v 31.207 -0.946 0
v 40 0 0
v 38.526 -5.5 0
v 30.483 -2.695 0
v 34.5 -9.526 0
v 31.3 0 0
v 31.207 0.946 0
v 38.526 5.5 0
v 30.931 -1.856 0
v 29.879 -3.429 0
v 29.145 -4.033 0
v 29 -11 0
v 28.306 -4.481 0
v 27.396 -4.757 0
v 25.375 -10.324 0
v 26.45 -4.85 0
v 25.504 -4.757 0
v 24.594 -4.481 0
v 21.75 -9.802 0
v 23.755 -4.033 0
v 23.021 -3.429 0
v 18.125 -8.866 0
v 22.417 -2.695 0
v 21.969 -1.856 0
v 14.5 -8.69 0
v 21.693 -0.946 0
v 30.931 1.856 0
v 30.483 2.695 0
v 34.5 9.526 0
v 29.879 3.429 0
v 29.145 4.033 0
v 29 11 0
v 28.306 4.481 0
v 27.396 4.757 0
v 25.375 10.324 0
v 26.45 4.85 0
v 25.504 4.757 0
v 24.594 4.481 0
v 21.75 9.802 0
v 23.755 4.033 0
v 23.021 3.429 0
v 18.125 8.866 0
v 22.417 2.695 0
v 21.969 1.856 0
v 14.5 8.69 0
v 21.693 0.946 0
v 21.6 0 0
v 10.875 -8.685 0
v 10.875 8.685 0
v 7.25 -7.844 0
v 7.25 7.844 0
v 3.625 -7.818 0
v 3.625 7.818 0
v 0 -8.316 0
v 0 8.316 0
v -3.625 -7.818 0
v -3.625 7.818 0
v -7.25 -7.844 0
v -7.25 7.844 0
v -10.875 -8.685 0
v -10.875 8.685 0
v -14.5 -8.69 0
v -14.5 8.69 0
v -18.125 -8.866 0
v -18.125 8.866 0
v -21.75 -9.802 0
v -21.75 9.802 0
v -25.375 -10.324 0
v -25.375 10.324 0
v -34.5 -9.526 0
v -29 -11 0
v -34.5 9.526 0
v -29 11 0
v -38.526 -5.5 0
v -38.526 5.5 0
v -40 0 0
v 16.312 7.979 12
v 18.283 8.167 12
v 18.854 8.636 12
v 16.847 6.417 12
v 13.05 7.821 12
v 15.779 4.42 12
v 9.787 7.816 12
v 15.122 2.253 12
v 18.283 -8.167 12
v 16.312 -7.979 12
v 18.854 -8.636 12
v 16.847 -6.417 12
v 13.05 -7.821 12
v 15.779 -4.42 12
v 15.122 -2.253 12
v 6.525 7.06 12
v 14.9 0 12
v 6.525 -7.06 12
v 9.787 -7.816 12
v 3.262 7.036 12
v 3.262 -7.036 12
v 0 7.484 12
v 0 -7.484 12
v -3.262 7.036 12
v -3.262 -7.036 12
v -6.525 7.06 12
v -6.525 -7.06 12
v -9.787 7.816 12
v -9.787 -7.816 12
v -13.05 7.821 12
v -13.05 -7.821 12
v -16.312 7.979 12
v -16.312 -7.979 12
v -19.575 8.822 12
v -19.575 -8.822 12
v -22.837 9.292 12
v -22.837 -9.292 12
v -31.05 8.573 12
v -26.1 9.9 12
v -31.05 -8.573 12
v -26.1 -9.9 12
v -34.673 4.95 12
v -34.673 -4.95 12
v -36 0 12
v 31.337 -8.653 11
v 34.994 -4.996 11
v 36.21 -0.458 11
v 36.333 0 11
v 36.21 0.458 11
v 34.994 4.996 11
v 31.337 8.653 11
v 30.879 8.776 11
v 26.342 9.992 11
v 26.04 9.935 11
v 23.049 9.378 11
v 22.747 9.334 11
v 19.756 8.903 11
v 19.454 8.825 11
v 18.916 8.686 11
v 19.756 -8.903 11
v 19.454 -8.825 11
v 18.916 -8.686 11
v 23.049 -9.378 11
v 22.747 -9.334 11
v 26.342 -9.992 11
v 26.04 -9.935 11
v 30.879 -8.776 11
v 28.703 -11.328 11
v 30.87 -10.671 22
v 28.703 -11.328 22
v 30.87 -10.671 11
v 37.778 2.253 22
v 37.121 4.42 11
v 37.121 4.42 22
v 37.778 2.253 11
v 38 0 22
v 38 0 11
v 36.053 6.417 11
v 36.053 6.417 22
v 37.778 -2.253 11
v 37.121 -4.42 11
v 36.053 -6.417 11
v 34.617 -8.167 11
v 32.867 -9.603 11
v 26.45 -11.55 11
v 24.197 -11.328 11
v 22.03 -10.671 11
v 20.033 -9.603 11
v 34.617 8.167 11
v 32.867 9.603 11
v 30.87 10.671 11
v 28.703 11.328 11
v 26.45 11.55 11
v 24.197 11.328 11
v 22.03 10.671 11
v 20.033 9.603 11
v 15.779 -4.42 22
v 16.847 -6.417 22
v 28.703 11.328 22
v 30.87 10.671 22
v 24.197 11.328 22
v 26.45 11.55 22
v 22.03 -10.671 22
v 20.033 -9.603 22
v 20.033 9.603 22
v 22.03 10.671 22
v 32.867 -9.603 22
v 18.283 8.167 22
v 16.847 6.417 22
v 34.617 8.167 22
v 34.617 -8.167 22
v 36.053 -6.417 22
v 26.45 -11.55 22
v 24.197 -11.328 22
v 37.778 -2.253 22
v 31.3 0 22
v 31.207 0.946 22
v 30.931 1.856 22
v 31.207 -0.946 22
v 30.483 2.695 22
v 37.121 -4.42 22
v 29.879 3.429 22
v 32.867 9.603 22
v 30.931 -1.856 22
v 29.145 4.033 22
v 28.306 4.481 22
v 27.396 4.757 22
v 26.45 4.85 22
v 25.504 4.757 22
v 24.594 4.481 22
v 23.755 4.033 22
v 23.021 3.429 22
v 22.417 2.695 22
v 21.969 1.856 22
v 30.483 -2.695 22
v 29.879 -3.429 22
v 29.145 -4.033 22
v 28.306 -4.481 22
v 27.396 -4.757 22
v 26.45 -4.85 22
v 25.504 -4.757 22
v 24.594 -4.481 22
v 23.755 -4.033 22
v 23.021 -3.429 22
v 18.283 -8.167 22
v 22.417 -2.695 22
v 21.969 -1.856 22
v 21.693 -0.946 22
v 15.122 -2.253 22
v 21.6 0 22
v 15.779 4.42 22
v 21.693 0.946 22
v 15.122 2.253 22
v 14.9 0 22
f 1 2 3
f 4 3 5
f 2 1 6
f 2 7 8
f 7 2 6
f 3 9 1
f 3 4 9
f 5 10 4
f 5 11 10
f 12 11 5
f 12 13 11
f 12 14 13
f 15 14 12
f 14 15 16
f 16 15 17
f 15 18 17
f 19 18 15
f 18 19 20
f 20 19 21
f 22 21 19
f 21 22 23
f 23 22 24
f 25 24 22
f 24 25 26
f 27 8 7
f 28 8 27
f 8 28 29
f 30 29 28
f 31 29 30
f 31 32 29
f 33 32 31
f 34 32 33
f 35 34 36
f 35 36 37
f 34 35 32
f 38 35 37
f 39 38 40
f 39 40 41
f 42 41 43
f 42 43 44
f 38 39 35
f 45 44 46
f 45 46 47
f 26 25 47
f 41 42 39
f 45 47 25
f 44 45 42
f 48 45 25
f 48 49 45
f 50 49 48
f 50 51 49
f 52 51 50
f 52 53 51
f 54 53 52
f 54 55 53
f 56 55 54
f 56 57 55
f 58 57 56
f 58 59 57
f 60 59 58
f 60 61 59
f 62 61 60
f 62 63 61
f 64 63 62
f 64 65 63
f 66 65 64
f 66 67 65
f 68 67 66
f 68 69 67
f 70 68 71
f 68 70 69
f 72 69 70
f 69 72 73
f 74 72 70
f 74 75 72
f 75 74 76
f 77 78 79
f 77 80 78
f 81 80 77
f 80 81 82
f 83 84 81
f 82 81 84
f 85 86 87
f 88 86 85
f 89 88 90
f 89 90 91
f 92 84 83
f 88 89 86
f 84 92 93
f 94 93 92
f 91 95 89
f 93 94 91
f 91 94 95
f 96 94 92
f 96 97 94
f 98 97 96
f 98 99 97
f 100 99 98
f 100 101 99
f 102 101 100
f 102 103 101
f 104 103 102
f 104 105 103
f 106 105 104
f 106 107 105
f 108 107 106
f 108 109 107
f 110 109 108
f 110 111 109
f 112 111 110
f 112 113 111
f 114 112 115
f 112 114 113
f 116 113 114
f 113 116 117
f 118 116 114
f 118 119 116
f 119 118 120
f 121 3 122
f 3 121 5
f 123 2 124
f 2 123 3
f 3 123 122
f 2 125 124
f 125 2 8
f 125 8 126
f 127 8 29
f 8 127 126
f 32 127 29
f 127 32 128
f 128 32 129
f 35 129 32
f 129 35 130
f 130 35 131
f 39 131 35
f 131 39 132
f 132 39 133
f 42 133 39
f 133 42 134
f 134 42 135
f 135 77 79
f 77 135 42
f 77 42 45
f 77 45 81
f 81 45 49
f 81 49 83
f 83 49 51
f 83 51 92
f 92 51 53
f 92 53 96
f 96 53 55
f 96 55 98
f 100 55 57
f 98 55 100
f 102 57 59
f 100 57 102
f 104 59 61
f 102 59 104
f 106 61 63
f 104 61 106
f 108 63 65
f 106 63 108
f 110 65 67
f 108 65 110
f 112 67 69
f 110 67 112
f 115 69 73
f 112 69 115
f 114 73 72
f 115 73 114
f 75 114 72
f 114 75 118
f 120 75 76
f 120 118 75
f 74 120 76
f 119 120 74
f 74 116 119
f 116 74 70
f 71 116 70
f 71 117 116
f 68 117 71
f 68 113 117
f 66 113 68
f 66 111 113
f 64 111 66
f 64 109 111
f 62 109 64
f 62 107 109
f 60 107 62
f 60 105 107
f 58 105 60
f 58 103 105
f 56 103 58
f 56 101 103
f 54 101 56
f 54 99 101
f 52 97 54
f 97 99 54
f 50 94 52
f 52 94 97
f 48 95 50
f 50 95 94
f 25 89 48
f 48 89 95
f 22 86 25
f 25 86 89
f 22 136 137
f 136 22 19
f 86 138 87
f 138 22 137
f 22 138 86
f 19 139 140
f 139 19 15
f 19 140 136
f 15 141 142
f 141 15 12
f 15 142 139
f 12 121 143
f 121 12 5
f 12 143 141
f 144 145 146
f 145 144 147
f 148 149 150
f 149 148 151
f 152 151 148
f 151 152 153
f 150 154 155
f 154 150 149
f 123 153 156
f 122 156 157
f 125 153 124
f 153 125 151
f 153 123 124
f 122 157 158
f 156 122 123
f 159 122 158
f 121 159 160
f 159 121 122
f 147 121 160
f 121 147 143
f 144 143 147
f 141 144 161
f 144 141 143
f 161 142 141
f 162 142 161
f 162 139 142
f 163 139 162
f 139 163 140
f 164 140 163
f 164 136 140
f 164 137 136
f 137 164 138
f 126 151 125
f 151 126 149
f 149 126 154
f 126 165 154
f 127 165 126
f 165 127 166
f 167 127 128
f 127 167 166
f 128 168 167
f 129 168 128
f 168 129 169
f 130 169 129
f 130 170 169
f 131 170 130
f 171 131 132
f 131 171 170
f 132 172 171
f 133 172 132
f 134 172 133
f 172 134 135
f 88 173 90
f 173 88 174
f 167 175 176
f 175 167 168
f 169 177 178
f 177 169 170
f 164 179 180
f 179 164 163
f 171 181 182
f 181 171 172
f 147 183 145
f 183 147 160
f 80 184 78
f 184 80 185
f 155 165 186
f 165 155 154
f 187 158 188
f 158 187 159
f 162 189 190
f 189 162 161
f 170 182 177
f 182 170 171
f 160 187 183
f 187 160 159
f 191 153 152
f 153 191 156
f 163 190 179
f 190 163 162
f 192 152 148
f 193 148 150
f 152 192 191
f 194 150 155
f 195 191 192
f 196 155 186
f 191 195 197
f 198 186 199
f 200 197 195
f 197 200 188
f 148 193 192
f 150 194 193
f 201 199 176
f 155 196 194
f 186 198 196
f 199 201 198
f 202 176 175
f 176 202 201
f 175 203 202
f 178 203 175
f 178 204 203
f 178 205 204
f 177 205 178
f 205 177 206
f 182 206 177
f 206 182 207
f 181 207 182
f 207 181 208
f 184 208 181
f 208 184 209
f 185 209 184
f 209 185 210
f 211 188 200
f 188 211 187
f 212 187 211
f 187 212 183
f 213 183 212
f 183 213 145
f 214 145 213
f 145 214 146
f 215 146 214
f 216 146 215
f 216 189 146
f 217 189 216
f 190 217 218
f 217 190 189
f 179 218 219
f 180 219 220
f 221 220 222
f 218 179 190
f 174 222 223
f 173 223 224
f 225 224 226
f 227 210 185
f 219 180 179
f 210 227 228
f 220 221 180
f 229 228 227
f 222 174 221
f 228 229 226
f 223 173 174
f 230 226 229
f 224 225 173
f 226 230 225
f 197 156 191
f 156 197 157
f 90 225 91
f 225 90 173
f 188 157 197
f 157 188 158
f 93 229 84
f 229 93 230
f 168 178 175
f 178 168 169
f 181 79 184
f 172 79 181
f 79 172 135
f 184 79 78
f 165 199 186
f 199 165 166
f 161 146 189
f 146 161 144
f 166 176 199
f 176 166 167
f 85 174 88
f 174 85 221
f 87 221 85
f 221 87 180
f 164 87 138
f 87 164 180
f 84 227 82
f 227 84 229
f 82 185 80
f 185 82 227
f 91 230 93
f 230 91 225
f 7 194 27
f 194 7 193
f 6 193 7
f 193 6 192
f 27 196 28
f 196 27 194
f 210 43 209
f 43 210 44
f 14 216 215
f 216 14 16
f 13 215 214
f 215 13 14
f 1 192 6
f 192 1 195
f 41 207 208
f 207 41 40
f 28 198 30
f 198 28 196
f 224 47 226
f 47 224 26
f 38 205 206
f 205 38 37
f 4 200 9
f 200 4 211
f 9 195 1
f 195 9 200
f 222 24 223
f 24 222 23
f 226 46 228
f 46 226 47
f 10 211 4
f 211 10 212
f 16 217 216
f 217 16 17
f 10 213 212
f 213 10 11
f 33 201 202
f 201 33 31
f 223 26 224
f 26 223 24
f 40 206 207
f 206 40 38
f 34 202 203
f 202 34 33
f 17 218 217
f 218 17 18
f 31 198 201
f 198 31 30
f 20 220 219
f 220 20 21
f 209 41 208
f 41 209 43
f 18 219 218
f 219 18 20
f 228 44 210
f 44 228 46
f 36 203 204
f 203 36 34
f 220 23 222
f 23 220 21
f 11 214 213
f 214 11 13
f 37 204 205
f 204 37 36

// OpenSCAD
$fn = 32;

// ----------------------------------------------------------------------
// Handle: 80 x 22 mm grip, 12 mm thick
// ----------------------------------------------------------------------

// --- parameters (mm) ---
length = 80;              // grip length
width = 22;               // grip width
thickness = 12;           // grip thickness
waist = 0.72;             // width factor at the middle
draft = 0.9;              // top face scale of the extrusion
scallops = 5;             // finger rests per side
ripple = 0.05;            // depth factor of the finger rests
boss_d = 23.1;            // mounting boss diameter
boss_h = 10;              // mounting boss height
boss_hole_d = 9.7;        // screw clearance through the boss
boss_r = 26.45;           // boss centre from the grip centre

/* ergonomic grip outline, closed spline-like polygon in the XY plane */
grip = [[-29, 11], [-25.375, 10.324], [-21.75, 9.802], [-18.125, 8.866], [-14.5, 8.69], [-10.875, 8.685], [-7.25, 7.844], [-3.625, 7.818], [0, 8.316], [3.625, 7.818], [7.25, 7.844], [10.875, 8.685], [14.5, 8.69], [18.125, 8.866], [21.75, 9.802], [25.375, 10.324], [29, 11], [34.5, 9.526], [38.526, 5.5], [40, 0], [38.526, -5.5], [34.5, -9.526], [29, -11], [29, -11], [25.375, -10.324], [21.75, -9.802], [18.125, -8.866], [14.5, -8.69], [10.875, -8.685], [7.25, -7.844], [3.625, -7.818], [0, -8.316], [-3.625, -7.818], [-7.25, -7.844], [-10.875, -8.685], [-14.5, -8.69], [-18.125, -8.866], [-21.75, -9.802], [-25.375, -10.324], [-29, -11], [-34.5, -9.526], [-38.526, -5.5], [-40, 0], [-38.526, 5.5], [-34.5, 9.526], [-29, 11]];

module grip_body() {
  linear_extrude(height = thickness, scale = draft) polygon(grip);
}

module boss_body() {
  /* sunk 1 mm into the grip so the joint overlaps */
  translate([boss_r, 0, thickness - 1]) cylinder(h = boss_h + 1, d = boss_d);
}

difference() {
  union() {
    grip_body();
    boss_body();
  }
  translate([boss_r, 0, -1]) cylinder(h = thickness + boss_h + 2, d = boss_hole_d);
}
